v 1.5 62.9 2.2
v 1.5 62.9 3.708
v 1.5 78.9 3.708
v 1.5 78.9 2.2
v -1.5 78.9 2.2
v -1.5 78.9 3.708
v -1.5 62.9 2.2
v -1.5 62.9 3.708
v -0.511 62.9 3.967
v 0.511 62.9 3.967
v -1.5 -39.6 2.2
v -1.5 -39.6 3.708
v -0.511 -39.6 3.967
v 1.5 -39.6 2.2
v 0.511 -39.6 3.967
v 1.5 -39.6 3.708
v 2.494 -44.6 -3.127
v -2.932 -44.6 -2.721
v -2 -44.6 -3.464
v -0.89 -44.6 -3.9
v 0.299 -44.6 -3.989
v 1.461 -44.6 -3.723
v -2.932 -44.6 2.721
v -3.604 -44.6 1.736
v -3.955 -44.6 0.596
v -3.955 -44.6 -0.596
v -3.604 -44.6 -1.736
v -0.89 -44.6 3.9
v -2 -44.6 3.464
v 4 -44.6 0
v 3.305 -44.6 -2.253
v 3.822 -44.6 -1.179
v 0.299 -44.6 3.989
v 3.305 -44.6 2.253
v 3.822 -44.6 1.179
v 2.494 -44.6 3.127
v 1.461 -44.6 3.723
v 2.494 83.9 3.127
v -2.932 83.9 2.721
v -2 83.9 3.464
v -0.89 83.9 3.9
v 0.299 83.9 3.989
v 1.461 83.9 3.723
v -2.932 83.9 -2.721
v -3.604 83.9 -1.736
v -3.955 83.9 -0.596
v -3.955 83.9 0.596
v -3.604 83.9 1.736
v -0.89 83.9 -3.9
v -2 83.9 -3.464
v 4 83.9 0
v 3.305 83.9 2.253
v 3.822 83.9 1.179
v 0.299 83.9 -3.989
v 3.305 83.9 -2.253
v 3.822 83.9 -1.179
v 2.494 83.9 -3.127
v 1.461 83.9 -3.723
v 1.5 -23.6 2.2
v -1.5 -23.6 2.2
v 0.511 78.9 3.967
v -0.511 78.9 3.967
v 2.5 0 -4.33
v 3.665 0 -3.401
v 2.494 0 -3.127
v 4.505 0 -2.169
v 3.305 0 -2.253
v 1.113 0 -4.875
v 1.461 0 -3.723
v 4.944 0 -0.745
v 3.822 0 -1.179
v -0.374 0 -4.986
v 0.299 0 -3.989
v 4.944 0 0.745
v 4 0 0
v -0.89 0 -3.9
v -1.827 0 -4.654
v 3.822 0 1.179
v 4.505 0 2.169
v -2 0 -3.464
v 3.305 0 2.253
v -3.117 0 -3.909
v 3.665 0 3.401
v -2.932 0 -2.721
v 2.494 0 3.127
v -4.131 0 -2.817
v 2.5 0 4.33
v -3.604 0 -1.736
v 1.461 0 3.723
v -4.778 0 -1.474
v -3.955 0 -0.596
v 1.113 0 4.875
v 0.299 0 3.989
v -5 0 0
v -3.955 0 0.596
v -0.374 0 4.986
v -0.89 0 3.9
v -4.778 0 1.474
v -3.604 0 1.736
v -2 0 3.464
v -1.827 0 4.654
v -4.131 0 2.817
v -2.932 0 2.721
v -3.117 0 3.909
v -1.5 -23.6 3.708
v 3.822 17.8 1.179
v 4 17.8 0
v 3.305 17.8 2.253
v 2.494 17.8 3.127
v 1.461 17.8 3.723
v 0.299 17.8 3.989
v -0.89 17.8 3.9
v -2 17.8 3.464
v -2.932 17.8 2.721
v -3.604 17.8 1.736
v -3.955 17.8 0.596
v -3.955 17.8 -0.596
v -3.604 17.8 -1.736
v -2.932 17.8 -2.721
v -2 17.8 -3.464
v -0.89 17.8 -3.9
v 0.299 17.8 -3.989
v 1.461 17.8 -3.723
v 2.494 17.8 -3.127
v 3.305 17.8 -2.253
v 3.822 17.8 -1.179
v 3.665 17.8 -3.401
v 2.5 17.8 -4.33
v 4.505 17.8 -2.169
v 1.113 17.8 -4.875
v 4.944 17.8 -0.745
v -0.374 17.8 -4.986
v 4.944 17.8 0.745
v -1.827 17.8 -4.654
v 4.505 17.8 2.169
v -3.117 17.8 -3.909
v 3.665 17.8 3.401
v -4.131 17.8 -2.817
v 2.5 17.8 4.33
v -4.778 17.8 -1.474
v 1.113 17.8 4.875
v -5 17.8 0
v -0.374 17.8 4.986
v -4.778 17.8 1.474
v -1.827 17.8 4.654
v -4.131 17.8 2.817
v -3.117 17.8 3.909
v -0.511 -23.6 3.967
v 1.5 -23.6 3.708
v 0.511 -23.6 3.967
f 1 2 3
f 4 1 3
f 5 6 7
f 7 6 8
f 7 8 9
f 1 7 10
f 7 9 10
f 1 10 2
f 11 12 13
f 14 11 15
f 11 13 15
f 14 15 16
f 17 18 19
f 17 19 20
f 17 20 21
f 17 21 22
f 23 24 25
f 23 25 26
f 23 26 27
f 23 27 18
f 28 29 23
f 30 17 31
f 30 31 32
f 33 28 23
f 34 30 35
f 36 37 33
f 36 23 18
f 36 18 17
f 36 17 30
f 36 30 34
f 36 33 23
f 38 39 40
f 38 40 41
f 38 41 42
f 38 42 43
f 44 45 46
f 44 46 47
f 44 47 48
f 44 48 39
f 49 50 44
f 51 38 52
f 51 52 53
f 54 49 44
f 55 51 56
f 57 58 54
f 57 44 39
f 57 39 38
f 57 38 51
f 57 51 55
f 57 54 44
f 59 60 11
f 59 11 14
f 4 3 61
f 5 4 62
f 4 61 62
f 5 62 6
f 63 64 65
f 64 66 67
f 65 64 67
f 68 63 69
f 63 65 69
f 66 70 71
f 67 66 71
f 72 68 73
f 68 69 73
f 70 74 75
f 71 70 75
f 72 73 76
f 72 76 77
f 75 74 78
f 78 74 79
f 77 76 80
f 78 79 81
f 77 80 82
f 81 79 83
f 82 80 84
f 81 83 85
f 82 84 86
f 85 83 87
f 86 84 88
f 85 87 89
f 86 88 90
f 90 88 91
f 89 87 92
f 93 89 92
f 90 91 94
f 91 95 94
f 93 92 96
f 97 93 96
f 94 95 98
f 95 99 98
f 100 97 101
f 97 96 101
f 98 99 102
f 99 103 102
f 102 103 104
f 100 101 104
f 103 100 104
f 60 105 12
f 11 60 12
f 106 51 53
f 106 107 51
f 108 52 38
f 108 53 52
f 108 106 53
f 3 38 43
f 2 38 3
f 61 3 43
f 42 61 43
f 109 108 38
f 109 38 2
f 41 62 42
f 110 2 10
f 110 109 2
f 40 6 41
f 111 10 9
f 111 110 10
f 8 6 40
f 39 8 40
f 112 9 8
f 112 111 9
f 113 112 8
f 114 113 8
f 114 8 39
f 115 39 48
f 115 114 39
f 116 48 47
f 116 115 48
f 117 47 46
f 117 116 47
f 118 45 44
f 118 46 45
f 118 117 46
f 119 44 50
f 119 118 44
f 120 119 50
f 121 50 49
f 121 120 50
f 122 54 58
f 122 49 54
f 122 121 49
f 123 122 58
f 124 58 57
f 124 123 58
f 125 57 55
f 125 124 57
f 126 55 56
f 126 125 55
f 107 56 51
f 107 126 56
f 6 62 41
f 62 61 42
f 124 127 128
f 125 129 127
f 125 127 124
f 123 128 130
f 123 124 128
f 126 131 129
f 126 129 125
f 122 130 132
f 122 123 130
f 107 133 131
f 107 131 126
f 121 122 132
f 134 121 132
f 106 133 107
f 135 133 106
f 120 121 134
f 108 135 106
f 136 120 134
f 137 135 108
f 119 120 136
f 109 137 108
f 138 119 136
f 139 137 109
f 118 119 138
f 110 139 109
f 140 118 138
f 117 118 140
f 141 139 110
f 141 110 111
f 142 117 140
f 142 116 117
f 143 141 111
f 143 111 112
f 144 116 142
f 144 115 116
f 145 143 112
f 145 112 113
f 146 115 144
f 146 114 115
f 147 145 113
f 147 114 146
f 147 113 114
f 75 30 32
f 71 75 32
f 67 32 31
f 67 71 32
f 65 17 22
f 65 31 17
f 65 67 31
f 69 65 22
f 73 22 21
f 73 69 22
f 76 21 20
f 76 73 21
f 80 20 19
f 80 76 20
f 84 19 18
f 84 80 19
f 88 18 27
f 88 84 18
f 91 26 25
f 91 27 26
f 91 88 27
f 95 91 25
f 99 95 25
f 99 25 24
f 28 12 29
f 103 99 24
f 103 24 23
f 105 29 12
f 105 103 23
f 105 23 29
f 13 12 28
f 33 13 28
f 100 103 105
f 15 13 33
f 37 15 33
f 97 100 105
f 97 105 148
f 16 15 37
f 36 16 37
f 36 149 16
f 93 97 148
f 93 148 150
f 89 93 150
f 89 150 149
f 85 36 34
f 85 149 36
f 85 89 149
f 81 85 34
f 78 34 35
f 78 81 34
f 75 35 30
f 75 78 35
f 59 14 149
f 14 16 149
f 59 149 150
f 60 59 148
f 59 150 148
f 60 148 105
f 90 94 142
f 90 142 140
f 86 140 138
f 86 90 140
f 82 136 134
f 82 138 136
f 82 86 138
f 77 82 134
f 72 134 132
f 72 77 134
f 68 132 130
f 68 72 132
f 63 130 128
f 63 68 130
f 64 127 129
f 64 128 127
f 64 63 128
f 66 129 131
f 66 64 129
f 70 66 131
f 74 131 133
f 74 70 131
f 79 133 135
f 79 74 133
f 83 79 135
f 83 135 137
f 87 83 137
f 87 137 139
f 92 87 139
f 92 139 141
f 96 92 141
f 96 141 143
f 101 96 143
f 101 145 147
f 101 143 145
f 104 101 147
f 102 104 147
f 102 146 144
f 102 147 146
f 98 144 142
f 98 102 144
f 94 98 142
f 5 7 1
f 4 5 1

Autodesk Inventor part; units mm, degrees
ref_plane "YZ Plane" through (0, 0, 0) normal (1, 0, 0) x (0, 1, 0)
ref_plane "XZ Plane" through (0, 0, 0) normal (0, 1, 0) x (-1, 0, 0)
sketch "スケッチ1" plane through (0, 0, 0) normal (0, 1, 0) x (-1, 0, 0)
  circle A0 centre (0, 0) radius 5
  dimension "d0" = 10
extrude "押し出し1" add sketch "スケッチ1" along normal blind 17.8
sketch "スケッチ2" plane through (0, 17.8, 0) normal (0, 1, 0) x (1, 0, 0)
  circle A0 centre (0, 0) radius 4
  dimension "d3" = 8
extrude "押し出し2" add sketch "スケッチ2" along normal blind 66.1
sketch "スケッチ3" plane through (0, 0, 0) normal (0, -1, 0) x (1, 0, 0)
  circle A0 centre (0, 0) radius 4
  dimension "d6" = 8
extrude "押し出し3" add sketch "スケッチ3" along normal blind 44.6
sketch "スケッチ4" plane through (0, -44.6, 0) normal (0, -1, 0) x (1, 0, 0)
  circle A0 centre (0, 0) radius 4 projected
  point P0 (0, 4)
ref_plane "作業平面1" through (0, -44.6, 4) normal (0, 0, 1) x (1, 0, 0)
sketch "スケッチ7" plane through (0, -44.6, 4) normal (0, 0, 1) x (1, 0, 0)
  line L0 (-1.5, 5) -> (1.5, 5)
  line L1 (1.5, 5) -> (1.5, 21)
  line L2 (1.5, 21) -> (-1.5, 21)
  line L3 (-1.5, 21) -> (-1.5, 5)
  line L4 (-1.5, 5) -> (1.5, 21) construction
  line L5 (1.5, 5) -> (-1.5, 21) construction
  line L6 (-4, 0) -> (4, 0) projected
  line L7 (-1.5, 107.5) -> (1.5, 107.5)
  line L8 (1.5, 107.5) -> (1.5, 123.5)
  line L9 (1.5, 123.5) -> (-1.5, 123.5)
  line L10 (-1.5, 123.5) -> (-1.5, 107.5)
  line L11 (-1.5, 107.5) -> (1.5, 123.5) construction
  line L12 (1.5, 107.5) -> (-1.5, 123.5) construction
  line L13 (4, 128.5) -> (-4, 128.5) projected
  point P0 (0, 44.6)
  point P1 (0, 13)
  point P2 (0, 115.5)
  dimension "d17" = 3
  dimension "d18" = 16
  dimension "d19" = 5
  dimension "d20" = 3
  dimension "d21" = 16
  dimension "d22" = 5
extrude "押し出し5" cut sketch "スケッチ7" against normal blind 1.8
properties part number "shoulder2_shaft2" material "鋼、炭素鋼"
